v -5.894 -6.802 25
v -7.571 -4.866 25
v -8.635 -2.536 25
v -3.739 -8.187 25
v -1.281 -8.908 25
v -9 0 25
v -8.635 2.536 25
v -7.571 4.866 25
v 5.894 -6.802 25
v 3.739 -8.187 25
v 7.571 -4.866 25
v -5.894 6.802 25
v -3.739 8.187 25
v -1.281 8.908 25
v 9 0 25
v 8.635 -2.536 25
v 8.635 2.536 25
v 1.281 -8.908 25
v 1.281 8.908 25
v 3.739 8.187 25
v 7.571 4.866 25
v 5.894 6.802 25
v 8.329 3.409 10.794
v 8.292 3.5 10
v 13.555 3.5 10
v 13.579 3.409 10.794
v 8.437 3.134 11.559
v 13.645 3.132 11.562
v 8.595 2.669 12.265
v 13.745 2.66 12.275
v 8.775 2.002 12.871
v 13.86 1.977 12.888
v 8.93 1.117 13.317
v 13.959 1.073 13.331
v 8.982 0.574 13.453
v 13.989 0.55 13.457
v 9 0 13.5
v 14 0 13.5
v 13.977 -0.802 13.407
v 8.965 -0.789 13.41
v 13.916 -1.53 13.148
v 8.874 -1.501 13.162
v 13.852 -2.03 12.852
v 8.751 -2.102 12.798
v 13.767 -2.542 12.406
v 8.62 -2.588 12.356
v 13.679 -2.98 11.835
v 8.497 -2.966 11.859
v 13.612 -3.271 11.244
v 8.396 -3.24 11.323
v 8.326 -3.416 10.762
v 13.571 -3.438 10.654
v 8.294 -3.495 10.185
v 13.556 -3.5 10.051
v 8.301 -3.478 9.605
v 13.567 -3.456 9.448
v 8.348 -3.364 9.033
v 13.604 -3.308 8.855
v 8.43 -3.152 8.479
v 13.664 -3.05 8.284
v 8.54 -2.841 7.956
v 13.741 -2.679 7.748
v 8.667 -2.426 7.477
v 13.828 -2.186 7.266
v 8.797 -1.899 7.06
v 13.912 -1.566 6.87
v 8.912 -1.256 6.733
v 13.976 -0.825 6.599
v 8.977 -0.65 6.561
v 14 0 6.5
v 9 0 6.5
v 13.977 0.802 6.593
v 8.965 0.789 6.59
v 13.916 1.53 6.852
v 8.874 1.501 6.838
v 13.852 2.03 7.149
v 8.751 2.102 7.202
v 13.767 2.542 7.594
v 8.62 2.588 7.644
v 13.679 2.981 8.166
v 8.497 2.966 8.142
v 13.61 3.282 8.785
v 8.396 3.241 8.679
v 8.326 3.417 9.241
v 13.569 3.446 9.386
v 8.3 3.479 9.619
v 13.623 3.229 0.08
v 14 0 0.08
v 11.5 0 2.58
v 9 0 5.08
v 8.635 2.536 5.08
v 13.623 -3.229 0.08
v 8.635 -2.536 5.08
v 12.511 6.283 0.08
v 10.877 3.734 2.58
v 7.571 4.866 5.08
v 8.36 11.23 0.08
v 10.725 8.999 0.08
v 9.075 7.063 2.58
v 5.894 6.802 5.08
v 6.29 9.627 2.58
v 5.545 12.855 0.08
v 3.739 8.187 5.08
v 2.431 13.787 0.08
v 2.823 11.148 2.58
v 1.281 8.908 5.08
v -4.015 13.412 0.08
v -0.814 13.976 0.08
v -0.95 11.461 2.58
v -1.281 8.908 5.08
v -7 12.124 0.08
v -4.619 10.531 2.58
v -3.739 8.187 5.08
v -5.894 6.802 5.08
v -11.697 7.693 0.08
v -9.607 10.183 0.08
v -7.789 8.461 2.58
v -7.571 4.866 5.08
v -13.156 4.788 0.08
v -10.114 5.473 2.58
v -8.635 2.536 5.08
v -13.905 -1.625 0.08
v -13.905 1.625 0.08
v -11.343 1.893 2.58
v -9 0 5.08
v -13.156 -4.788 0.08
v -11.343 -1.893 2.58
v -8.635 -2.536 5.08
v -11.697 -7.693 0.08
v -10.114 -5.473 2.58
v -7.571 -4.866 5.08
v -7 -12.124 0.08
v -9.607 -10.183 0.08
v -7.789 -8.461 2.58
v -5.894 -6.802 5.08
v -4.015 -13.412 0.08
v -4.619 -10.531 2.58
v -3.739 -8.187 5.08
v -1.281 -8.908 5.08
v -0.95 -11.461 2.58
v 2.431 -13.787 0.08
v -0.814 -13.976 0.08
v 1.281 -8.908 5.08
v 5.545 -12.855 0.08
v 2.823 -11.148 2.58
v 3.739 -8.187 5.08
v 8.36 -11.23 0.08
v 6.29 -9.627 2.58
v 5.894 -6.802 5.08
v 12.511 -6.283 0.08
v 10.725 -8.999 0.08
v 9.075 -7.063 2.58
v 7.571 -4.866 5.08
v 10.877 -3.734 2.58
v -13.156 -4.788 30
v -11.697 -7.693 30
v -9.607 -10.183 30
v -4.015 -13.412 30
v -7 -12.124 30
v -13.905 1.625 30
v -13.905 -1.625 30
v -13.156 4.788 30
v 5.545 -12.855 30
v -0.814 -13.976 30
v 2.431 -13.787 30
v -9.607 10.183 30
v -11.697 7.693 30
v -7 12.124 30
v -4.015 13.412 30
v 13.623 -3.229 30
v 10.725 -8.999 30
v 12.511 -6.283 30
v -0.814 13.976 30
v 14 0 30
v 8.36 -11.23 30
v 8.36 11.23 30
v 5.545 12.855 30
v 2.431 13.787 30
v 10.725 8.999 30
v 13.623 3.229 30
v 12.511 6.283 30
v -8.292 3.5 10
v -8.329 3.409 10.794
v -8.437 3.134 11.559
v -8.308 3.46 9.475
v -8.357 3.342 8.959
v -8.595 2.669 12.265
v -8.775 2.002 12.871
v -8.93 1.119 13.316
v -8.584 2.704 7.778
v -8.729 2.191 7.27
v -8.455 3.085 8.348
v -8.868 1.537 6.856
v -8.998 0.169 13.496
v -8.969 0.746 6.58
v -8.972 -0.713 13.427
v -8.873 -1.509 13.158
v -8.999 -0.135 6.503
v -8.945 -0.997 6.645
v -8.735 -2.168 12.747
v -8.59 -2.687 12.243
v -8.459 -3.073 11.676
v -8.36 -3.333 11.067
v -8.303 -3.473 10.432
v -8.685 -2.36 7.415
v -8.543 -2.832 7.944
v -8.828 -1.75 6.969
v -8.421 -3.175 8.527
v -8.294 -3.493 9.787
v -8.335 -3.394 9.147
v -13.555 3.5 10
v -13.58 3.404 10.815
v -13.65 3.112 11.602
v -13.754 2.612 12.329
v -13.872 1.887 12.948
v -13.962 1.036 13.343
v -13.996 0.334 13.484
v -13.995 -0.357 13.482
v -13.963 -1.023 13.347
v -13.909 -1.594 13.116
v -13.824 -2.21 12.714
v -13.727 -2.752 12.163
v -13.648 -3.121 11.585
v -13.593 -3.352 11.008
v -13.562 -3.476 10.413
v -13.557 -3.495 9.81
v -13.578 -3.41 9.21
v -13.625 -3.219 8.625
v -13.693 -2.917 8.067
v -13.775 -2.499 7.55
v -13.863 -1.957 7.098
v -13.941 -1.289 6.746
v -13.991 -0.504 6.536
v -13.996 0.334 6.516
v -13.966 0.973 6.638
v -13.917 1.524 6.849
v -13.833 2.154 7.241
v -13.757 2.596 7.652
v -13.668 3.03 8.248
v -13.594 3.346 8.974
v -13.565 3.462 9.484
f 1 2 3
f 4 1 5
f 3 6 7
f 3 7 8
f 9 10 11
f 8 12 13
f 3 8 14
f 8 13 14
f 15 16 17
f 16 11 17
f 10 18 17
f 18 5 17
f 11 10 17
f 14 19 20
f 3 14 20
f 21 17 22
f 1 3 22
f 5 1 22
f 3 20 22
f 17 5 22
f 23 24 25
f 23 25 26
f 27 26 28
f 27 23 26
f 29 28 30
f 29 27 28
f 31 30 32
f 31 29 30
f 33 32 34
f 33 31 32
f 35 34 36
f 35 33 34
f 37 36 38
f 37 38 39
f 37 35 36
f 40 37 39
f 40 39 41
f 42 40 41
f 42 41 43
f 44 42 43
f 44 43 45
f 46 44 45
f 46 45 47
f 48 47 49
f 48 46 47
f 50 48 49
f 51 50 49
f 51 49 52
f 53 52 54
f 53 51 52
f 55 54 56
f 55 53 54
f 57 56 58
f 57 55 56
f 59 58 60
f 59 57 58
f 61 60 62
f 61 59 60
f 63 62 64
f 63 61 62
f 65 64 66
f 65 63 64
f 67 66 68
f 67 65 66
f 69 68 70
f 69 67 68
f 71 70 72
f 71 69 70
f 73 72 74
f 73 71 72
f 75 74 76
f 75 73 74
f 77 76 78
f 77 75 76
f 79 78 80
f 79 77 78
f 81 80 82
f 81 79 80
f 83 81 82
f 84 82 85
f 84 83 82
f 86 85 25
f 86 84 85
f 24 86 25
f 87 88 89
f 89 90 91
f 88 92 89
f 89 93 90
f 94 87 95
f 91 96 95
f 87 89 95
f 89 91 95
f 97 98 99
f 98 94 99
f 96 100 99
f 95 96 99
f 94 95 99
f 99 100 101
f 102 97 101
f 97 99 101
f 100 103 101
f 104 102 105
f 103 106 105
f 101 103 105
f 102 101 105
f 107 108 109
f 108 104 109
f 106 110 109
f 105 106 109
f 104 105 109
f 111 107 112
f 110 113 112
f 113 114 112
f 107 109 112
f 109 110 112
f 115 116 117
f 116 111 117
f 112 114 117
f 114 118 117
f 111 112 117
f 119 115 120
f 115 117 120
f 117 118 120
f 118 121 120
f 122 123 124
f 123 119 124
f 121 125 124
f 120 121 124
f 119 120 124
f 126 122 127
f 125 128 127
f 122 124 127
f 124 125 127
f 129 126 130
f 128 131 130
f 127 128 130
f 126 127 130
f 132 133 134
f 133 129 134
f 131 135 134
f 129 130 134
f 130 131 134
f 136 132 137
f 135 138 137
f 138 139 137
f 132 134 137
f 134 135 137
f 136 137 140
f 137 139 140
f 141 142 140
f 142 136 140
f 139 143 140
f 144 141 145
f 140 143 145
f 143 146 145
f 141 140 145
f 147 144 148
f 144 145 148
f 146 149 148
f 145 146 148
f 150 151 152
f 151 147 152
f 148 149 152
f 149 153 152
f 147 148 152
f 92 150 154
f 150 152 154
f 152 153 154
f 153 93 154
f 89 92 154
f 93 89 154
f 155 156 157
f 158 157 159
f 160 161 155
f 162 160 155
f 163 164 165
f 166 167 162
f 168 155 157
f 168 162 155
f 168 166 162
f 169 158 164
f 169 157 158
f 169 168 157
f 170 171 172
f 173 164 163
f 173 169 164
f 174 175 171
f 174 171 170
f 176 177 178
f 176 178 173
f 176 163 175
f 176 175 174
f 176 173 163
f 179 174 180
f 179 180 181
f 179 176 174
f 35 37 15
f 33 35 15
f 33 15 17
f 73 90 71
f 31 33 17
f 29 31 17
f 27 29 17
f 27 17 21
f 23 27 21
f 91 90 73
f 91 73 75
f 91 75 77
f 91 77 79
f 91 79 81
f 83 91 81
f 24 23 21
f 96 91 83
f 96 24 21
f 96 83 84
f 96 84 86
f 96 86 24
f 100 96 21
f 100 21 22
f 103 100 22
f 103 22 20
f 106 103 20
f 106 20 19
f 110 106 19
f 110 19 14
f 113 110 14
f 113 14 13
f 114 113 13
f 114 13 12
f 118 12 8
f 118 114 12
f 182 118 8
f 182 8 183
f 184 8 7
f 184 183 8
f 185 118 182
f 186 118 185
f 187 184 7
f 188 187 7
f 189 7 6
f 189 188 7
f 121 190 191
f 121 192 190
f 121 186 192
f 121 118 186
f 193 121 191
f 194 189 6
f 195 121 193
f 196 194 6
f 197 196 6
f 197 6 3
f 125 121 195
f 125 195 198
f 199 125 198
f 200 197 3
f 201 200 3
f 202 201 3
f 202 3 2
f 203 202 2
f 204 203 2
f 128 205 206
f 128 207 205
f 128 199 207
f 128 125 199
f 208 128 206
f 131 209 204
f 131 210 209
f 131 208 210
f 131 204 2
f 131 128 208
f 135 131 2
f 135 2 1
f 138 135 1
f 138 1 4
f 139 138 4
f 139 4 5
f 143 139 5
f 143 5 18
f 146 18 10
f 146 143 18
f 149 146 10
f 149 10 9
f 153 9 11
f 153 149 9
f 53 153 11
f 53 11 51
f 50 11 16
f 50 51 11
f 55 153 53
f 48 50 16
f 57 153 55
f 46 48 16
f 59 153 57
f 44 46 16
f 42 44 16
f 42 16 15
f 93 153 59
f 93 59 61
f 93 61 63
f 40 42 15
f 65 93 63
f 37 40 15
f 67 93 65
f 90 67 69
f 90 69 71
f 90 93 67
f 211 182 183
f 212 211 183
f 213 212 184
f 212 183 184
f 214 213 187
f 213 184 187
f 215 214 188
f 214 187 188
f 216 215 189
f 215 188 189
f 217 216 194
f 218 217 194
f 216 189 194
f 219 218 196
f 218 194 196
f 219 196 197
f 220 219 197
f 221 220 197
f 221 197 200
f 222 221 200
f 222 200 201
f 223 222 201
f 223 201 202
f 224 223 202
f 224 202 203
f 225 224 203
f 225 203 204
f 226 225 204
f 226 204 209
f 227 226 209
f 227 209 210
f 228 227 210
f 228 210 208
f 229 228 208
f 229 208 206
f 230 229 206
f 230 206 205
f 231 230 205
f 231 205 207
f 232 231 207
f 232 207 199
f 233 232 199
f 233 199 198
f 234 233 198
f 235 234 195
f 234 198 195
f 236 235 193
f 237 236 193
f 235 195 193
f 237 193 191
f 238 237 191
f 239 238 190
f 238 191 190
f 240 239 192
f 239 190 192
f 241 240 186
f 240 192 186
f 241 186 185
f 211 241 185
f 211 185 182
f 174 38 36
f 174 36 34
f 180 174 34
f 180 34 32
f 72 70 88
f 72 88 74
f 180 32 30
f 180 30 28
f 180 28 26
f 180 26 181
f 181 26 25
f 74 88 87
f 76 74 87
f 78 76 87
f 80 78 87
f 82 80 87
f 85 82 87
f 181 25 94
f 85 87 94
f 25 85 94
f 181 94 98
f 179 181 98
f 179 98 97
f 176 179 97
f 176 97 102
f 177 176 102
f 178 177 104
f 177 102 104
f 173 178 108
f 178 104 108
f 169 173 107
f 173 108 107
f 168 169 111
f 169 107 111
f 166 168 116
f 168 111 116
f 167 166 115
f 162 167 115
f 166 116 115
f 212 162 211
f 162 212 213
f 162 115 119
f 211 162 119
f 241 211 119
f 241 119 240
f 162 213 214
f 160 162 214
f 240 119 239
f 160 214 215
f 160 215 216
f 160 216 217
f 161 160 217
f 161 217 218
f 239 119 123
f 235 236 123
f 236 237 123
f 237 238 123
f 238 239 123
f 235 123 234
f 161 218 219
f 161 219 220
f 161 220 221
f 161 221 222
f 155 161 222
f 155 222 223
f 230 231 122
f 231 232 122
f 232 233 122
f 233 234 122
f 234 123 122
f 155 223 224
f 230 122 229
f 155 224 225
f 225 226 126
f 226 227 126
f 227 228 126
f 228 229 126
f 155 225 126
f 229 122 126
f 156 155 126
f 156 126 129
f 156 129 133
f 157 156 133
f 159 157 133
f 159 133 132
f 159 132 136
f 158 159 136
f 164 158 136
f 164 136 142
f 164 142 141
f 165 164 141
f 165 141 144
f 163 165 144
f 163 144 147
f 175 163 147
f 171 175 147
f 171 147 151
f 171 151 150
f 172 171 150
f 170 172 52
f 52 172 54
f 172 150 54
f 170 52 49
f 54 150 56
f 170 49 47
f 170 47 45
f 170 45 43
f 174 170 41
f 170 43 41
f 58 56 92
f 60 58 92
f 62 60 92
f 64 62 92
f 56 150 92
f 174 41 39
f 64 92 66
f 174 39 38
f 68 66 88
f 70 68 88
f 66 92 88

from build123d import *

# Parameters (mm, degrees)
F0_R          = 14
F1_DEPTH      = 30
F2_T          = -5
F3_R          = 3.5
F4_DEPTH      = 14.001
F4_DEPTH_BACK = 14.001


# Not quite as in the source:
# - a fillet or chamfer that OpenCascade refuses, or shapes differently, is made with other operations: its cross-section is extruded or revolved along the edge and cut away or added


with BuildPart() as f1:
    # F0 (on Top) → F1 (new body)
    with BuildSketch(Plane.XY):
        Circle(F0_R)
    extrude(amount=F1_DEPTH)

    # F2
    f2_openings = [f1.faces().sort_by_distance(p)[0] for p in [
        (0, 0, 0),
    ]]
    offset(amount=F2_T, openings=f2_openings)

    # F3 (on Right) → F4 (cut, two sides)
    with BuildSketch(Plane.YZ) as f4_sk:
        with Locations((0, 10)):
            Circle(F3_R)
    extrude(amount=-F4_DEPTH, mode=Mode.SUBTRACT)
    extrude(f4_sk.sketch, amount=F4_DEPTH_BACK, mode=Mode.SUBTRACT)

    # F5: chamfer of 5.08 on 1 edges, made by hand

    # F5_s1 → F5_t2 (revolve, cut)
    with BuildSketch(Plane.XZ):
        Polygon((14.08, 0), (9, 5.08), (9, 0), align=None)
    revolve(axis=Axis((0, 0, 0), (0, 0, 1)), mode=Mode.SUBTRACT)


solid = f1.part
